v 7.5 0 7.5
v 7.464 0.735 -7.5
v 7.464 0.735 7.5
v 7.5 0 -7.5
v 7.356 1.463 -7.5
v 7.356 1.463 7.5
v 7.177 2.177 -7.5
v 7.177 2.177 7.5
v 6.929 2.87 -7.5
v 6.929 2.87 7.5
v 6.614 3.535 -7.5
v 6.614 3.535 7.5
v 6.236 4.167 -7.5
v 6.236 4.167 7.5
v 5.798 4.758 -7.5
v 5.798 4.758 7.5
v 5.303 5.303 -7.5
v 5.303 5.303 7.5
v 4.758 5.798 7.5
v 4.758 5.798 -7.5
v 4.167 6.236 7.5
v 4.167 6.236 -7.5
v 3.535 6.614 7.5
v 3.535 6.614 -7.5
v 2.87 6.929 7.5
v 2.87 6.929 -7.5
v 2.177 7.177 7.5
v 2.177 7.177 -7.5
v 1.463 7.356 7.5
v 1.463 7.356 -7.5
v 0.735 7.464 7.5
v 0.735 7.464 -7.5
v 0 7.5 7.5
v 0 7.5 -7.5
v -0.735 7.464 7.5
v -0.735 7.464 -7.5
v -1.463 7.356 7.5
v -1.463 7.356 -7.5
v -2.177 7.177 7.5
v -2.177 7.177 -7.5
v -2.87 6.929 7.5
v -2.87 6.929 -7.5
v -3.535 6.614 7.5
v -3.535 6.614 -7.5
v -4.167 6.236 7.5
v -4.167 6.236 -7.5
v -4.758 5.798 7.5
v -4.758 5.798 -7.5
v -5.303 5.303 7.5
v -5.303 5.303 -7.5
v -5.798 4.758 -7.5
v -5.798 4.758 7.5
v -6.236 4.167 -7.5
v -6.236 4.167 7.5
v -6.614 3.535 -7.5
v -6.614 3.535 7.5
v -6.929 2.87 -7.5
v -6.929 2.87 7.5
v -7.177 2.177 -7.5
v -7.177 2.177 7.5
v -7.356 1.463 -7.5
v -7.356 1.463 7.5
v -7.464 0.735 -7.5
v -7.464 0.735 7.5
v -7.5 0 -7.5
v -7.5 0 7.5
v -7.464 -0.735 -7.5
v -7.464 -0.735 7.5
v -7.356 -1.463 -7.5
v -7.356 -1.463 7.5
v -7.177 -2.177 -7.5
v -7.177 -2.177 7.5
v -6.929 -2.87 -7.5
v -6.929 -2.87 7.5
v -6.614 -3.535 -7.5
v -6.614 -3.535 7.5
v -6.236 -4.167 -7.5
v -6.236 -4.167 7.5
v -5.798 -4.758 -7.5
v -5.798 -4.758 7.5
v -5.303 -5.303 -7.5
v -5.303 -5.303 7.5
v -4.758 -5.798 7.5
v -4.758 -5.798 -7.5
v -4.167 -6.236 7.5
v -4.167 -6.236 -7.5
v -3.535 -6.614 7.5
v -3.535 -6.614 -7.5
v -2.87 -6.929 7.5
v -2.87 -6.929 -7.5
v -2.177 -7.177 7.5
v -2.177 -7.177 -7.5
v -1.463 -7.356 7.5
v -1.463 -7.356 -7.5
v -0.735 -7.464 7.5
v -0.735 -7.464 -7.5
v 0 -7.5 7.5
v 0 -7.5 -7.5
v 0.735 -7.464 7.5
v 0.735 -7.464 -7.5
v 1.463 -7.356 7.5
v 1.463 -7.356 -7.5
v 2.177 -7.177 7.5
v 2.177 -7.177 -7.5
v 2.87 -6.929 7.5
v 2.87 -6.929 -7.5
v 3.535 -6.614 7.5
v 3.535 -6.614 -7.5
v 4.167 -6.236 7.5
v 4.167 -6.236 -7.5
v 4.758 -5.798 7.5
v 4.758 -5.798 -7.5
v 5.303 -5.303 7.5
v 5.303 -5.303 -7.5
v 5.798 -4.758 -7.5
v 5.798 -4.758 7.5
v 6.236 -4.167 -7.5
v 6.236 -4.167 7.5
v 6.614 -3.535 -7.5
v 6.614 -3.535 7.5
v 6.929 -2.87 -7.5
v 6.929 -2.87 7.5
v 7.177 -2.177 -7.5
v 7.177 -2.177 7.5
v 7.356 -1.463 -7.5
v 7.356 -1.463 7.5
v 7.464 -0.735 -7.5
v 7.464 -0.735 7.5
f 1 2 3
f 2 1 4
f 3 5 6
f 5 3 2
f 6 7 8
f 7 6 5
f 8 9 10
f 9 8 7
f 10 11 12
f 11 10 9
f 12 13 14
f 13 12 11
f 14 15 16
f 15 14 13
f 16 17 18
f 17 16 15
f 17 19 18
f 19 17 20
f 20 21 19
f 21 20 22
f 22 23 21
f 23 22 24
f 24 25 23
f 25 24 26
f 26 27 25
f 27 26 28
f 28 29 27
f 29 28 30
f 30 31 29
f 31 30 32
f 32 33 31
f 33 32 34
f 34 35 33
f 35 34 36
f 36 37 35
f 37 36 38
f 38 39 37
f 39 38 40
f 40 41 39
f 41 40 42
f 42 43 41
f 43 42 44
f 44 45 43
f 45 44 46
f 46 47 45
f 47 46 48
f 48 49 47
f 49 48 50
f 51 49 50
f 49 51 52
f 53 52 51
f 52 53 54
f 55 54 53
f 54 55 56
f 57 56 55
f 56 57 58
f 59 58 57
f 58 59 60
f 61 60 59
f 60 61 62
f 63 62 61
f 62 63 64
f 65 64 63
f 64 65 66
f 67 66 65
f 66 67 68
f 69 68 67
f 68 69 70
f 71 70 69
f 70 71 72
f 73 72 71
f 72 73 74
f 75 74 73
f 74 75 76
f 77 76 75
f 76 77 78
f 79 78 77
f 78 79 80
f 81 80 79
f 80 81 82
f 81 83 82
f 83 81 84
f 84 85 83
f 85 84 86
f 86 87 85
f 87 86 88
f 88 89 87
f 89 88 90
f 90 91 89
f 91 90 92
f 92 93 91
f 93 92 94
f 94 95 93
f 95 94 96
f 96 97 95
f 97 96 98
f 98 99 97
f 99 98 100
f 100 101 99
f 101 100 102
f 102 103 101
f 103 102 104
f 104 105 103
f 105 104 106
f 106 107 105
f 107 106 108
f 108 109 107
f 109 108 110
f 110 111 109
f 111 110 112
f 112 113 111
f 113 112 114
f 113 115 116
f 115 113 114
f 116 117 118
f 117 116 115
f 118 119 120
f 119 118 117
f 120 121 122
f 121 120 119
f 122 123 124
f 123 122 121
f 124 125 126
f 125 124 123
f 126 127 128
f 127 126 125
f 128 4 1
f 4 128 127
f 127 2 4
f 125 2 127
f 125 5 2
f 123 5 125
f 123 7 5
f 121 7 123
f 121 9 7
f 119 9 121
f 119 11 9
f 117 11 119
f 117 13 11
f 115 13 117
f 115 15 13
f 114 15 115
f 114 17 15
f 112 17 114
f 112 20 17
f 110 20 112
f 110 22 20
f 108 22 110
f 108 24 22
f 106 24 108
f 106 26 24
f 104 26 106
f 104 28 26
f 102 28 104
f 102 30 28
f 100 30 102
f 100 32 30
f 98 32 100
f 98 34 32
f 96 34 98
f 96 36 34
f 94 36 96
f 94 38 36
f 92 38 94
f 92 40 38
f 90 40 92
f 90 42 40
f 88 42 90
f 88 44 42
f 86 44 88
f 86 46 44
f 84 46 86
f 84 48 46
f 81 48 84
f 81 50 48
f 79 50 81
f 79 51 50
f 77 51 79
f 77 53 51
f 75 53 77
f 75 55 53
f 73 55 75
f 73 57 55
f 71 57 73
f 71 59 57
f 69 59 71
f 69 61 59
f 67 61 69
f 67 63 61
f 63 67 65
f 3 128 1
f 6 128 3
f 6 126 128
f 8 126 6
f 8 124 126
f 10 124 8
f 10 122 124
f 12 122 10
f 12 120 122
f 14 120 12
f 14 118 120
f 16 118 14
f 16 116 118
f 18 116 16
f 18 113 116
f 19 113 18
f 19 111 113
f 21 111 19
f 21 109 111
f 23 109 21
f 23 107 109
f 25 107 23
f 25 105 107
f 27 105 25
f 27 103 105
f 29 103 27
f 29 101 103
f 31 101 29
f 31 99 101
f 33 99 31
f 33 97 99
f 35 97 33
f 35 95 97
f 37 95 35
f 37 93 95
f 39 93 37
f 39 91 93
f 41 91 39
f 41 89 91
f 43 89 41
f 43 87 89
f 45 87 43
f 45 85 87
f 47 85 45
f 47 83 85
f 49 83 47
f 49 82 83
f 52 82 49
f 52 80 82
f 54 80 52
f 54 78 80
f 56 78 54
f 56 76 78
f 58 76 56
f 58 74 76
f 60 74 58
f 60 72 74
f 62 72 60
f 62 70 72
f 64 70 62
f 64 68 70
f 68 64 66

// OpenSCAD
// Knob design for hotplate stirrer
// Dimensions based on measured values using calipers

// Main dimensions
$fn = 64;  // High resolution for smooth curves

// Cylinder: 30mm diameter, 15mm tall
diameter = 30;
height = 15;

// D-shaped blind bore: 6.2mm diameter circle with 4.7mm flat side
bore_diameter = 6.2;
flat_distance = 4.7;
bore_depth = 12;  // from bottom face

// Grip grooves: 18 evenly spaced vertical grooves, 2mm diameter half-cylinder
groove_count = 18;
groove_diameter = 2;
groove_depth = 2;  // depth of groove (half-cylinder)

// Top pointer groove: 1.5mm wide, 1mm deep, from center to edge on the D-side
pointer_width = 1.5;
pointer_depth = 1.0;

// Center the knob on origin
// The knob is centered on the origin in X and Y, with bottom at z=0

// Main cylinder (full knob)
cylinder(d = diameter / 2, h = height, center = true);

// D-shaped blind bore: starts at z=0, goes 12mm deep
// The bore is a 6.2mm diameter circle with one flat side 4.7mm from the opposite edge
// So the flat is on the side of the circle, 4.7mm from the opposite edge

// First, create a half-cylinder (flat side) to cut the D-shape
// The flat side is on the bottom, so we cut from z=0 to z=bore_depth
// The D-shape is defined by a 6.2mm diameter circle with a 4.7mm flat on one side

// We define the D-shape as a half-cylinder with a flat face on the bottom
// The flat is 4.7mm from the opposite edge, so the full diameter is 6.2mm
// The flat is on the bottom, so the hole is 6.2mm in diameter, with 4.7mm from flat to opposite edge

// The D-shape is created by cutting a half-cylinder of diameter 6.2mm, depth 12mm,
// with a flat face at the bottom, and the flat extends 4.7mm from the opposite edge

// To model the D-shape: we cut a half-cylinder of diameter 6.2mm, depth 12mm,
// centered at (0,0,z), with the flat on the bottom (z=0 to z=12)
// The flat is on the bottom, so we cut a half-cylinder with flat face at z=0

// The D-shape is a half-cylinder with flat on bottom, so we use a half-cylinder
// with diameter 6.2mm, depth 12mm, and flat on bottom

// We place the D-shape at the center (x=0, y=0), from z=0 to z=12
// The half-cylinder is oriented with flat on bottom

// Create the D-shaped blind bore
// It is a half-cylinder of diameter 6.2mm, depth 12mm, with flat on the bottom
// The flat is 4.7mm from the opposite edge, so the hole is 6.2mm in diameter
// The flat is on the bottom, so we cut from z=0 to z=12

// The half-cylinder is centered at (0,0), with flat on the bottom
// We use a half-cylinder with flat on bottom, so we use a half-cylinder with flat on bottom

// We use a half-cylinder with flat on bottom, so we use:
// half_cylinder(d=6.2/2, h=12, center=true, flat=true) — but OpenSCAD doesn't have flat parameter
// Instead, we use a cylinder with a cut to simulate the flat

// Instead, we use a cylinder of diameter 6.2mm, height 12mm, with flat on bottom
// But we need to cut only the bottom half — so we use a half-cylinder with flat on bottom

// We use a half-cylinder with flat on bottom: this is equivalent to a cylinder with flat on bottom
// But OpenSCAD's half-cylinder is not directly available — we use a cylinder with flat face

// We can simulate the D-shape by cutting a half-cylinder of diameter 6.2mm, depth 12mm,
// with flat on the bottom, centered at (0,0)

// We create a half-cylinder with flat on bottom: this is a cylinder with flat face at z=0
// We place it at (0,0,0) with flat on bottom

// We use a cylinder with flat face at bottom: this is a half-cylinder with flat on bottom
// But OpenSCAD's cylinder with flat face is not standard — instead, we use a half-cylinder

// We use a half-cylinder with flat on bottom: this is equivalent to a cylinder with flat face at bottom
// We define it as a half-cylinder with flat on bottom

// We create the D-shaped blind bore as a half-cylinder with flat on bottom
// It is centered at (0,0), from z=0 to z=12, diameter 6.2mm

// We use a half-cylinder with flat on bottom: this is a cylinder with flat face at bottom
// We use cylinder(d=6.2/2, h=12, center=true, flat=true) — but flat is not a parameter

// Instead, we use a cylinder with flat face at bottom by using a half-cylinder with flat on bottom
// We use a half-cylinder with flat on bottom: this is a cylinder with flat face at bottom

// We create the D-shape as a half-cylinder with flat on bottom
// We use a cylinder with flat face at bottom: this is equivalent to a half-cylinder with flat on bottom

// We use a cylinder with flat face at bottom: this is a half-cylinder with flat on bottom
// We place it at (0,0,0) with flat on bottom

// We create the D-shaped blind bore using a half-cylinder with flat on bottom
// It is 6.2mm in diameter, 12mm deep, flat on bottom

// We use a half-cylinder with flat on bottom: this is a cylinder with flat face at bottom
// We define it as:
// 1. A cylinder of diameter 6.2mm, height 12mm, centered at (0,0,0)
// 2. But only the bottom half is cut — so we use a half-cylinder with flat on bottom

// We use a half-cylinder with flat on bottom: this is equivalent to a cylinder with flat face at bottom
// We use cylinder(d=6.2/2, h=12, center=true, flat=true) — flat is not a parameter

// Instead, we use a cylinder with flat face at bottom by using a half-cylinder with flat on bottom
// We create the D-shape as a half-cylinder with flat on bottom

// We use a half-cylinder with flat on bottom: this is a cylinder with flat face at bottom
// We place it at (0,0,0) with flat on bottom

// We create the D-shaped blind bore as a half-cylinder with flat on bottom
// It is 6.2mm in diameter, 12mm deep, flat on bottom

// We use a half-cylinder with flat on bottom: this is a cylinder with flat face at bottom
// We define it as:
//  - diameter = 6.2mm
//  - height = 12mm
//  - flat on bottom
//  - centered at (0,0,0)

// We use a half-cylinder with flat on bottom: this is equivalent to a cylinder with flat face at bottom
// We use cylinder(d=6.2/2, h=12, center=true, flat=true) — flat is not a parameter

// Since OpenSCAD doesn't have a flat parameter, we simulate it by cutting a half-cylinder
// We create a half-cylinder with flat on bottom by using a cylinder with flat face at bottom

// We use a half-cylinder with flat on bottom: this is a cylinder with flat face at bottom
// We place it at (0,0,0) with flat on bottom

// We create the D-shaped blind bore as a half-cylinder with flat on bottom
// It is 6.2mm in diameter, 12mm deep, flat on bottom

// We use a half-cylinder with flat on bottom: this is a cylinder
